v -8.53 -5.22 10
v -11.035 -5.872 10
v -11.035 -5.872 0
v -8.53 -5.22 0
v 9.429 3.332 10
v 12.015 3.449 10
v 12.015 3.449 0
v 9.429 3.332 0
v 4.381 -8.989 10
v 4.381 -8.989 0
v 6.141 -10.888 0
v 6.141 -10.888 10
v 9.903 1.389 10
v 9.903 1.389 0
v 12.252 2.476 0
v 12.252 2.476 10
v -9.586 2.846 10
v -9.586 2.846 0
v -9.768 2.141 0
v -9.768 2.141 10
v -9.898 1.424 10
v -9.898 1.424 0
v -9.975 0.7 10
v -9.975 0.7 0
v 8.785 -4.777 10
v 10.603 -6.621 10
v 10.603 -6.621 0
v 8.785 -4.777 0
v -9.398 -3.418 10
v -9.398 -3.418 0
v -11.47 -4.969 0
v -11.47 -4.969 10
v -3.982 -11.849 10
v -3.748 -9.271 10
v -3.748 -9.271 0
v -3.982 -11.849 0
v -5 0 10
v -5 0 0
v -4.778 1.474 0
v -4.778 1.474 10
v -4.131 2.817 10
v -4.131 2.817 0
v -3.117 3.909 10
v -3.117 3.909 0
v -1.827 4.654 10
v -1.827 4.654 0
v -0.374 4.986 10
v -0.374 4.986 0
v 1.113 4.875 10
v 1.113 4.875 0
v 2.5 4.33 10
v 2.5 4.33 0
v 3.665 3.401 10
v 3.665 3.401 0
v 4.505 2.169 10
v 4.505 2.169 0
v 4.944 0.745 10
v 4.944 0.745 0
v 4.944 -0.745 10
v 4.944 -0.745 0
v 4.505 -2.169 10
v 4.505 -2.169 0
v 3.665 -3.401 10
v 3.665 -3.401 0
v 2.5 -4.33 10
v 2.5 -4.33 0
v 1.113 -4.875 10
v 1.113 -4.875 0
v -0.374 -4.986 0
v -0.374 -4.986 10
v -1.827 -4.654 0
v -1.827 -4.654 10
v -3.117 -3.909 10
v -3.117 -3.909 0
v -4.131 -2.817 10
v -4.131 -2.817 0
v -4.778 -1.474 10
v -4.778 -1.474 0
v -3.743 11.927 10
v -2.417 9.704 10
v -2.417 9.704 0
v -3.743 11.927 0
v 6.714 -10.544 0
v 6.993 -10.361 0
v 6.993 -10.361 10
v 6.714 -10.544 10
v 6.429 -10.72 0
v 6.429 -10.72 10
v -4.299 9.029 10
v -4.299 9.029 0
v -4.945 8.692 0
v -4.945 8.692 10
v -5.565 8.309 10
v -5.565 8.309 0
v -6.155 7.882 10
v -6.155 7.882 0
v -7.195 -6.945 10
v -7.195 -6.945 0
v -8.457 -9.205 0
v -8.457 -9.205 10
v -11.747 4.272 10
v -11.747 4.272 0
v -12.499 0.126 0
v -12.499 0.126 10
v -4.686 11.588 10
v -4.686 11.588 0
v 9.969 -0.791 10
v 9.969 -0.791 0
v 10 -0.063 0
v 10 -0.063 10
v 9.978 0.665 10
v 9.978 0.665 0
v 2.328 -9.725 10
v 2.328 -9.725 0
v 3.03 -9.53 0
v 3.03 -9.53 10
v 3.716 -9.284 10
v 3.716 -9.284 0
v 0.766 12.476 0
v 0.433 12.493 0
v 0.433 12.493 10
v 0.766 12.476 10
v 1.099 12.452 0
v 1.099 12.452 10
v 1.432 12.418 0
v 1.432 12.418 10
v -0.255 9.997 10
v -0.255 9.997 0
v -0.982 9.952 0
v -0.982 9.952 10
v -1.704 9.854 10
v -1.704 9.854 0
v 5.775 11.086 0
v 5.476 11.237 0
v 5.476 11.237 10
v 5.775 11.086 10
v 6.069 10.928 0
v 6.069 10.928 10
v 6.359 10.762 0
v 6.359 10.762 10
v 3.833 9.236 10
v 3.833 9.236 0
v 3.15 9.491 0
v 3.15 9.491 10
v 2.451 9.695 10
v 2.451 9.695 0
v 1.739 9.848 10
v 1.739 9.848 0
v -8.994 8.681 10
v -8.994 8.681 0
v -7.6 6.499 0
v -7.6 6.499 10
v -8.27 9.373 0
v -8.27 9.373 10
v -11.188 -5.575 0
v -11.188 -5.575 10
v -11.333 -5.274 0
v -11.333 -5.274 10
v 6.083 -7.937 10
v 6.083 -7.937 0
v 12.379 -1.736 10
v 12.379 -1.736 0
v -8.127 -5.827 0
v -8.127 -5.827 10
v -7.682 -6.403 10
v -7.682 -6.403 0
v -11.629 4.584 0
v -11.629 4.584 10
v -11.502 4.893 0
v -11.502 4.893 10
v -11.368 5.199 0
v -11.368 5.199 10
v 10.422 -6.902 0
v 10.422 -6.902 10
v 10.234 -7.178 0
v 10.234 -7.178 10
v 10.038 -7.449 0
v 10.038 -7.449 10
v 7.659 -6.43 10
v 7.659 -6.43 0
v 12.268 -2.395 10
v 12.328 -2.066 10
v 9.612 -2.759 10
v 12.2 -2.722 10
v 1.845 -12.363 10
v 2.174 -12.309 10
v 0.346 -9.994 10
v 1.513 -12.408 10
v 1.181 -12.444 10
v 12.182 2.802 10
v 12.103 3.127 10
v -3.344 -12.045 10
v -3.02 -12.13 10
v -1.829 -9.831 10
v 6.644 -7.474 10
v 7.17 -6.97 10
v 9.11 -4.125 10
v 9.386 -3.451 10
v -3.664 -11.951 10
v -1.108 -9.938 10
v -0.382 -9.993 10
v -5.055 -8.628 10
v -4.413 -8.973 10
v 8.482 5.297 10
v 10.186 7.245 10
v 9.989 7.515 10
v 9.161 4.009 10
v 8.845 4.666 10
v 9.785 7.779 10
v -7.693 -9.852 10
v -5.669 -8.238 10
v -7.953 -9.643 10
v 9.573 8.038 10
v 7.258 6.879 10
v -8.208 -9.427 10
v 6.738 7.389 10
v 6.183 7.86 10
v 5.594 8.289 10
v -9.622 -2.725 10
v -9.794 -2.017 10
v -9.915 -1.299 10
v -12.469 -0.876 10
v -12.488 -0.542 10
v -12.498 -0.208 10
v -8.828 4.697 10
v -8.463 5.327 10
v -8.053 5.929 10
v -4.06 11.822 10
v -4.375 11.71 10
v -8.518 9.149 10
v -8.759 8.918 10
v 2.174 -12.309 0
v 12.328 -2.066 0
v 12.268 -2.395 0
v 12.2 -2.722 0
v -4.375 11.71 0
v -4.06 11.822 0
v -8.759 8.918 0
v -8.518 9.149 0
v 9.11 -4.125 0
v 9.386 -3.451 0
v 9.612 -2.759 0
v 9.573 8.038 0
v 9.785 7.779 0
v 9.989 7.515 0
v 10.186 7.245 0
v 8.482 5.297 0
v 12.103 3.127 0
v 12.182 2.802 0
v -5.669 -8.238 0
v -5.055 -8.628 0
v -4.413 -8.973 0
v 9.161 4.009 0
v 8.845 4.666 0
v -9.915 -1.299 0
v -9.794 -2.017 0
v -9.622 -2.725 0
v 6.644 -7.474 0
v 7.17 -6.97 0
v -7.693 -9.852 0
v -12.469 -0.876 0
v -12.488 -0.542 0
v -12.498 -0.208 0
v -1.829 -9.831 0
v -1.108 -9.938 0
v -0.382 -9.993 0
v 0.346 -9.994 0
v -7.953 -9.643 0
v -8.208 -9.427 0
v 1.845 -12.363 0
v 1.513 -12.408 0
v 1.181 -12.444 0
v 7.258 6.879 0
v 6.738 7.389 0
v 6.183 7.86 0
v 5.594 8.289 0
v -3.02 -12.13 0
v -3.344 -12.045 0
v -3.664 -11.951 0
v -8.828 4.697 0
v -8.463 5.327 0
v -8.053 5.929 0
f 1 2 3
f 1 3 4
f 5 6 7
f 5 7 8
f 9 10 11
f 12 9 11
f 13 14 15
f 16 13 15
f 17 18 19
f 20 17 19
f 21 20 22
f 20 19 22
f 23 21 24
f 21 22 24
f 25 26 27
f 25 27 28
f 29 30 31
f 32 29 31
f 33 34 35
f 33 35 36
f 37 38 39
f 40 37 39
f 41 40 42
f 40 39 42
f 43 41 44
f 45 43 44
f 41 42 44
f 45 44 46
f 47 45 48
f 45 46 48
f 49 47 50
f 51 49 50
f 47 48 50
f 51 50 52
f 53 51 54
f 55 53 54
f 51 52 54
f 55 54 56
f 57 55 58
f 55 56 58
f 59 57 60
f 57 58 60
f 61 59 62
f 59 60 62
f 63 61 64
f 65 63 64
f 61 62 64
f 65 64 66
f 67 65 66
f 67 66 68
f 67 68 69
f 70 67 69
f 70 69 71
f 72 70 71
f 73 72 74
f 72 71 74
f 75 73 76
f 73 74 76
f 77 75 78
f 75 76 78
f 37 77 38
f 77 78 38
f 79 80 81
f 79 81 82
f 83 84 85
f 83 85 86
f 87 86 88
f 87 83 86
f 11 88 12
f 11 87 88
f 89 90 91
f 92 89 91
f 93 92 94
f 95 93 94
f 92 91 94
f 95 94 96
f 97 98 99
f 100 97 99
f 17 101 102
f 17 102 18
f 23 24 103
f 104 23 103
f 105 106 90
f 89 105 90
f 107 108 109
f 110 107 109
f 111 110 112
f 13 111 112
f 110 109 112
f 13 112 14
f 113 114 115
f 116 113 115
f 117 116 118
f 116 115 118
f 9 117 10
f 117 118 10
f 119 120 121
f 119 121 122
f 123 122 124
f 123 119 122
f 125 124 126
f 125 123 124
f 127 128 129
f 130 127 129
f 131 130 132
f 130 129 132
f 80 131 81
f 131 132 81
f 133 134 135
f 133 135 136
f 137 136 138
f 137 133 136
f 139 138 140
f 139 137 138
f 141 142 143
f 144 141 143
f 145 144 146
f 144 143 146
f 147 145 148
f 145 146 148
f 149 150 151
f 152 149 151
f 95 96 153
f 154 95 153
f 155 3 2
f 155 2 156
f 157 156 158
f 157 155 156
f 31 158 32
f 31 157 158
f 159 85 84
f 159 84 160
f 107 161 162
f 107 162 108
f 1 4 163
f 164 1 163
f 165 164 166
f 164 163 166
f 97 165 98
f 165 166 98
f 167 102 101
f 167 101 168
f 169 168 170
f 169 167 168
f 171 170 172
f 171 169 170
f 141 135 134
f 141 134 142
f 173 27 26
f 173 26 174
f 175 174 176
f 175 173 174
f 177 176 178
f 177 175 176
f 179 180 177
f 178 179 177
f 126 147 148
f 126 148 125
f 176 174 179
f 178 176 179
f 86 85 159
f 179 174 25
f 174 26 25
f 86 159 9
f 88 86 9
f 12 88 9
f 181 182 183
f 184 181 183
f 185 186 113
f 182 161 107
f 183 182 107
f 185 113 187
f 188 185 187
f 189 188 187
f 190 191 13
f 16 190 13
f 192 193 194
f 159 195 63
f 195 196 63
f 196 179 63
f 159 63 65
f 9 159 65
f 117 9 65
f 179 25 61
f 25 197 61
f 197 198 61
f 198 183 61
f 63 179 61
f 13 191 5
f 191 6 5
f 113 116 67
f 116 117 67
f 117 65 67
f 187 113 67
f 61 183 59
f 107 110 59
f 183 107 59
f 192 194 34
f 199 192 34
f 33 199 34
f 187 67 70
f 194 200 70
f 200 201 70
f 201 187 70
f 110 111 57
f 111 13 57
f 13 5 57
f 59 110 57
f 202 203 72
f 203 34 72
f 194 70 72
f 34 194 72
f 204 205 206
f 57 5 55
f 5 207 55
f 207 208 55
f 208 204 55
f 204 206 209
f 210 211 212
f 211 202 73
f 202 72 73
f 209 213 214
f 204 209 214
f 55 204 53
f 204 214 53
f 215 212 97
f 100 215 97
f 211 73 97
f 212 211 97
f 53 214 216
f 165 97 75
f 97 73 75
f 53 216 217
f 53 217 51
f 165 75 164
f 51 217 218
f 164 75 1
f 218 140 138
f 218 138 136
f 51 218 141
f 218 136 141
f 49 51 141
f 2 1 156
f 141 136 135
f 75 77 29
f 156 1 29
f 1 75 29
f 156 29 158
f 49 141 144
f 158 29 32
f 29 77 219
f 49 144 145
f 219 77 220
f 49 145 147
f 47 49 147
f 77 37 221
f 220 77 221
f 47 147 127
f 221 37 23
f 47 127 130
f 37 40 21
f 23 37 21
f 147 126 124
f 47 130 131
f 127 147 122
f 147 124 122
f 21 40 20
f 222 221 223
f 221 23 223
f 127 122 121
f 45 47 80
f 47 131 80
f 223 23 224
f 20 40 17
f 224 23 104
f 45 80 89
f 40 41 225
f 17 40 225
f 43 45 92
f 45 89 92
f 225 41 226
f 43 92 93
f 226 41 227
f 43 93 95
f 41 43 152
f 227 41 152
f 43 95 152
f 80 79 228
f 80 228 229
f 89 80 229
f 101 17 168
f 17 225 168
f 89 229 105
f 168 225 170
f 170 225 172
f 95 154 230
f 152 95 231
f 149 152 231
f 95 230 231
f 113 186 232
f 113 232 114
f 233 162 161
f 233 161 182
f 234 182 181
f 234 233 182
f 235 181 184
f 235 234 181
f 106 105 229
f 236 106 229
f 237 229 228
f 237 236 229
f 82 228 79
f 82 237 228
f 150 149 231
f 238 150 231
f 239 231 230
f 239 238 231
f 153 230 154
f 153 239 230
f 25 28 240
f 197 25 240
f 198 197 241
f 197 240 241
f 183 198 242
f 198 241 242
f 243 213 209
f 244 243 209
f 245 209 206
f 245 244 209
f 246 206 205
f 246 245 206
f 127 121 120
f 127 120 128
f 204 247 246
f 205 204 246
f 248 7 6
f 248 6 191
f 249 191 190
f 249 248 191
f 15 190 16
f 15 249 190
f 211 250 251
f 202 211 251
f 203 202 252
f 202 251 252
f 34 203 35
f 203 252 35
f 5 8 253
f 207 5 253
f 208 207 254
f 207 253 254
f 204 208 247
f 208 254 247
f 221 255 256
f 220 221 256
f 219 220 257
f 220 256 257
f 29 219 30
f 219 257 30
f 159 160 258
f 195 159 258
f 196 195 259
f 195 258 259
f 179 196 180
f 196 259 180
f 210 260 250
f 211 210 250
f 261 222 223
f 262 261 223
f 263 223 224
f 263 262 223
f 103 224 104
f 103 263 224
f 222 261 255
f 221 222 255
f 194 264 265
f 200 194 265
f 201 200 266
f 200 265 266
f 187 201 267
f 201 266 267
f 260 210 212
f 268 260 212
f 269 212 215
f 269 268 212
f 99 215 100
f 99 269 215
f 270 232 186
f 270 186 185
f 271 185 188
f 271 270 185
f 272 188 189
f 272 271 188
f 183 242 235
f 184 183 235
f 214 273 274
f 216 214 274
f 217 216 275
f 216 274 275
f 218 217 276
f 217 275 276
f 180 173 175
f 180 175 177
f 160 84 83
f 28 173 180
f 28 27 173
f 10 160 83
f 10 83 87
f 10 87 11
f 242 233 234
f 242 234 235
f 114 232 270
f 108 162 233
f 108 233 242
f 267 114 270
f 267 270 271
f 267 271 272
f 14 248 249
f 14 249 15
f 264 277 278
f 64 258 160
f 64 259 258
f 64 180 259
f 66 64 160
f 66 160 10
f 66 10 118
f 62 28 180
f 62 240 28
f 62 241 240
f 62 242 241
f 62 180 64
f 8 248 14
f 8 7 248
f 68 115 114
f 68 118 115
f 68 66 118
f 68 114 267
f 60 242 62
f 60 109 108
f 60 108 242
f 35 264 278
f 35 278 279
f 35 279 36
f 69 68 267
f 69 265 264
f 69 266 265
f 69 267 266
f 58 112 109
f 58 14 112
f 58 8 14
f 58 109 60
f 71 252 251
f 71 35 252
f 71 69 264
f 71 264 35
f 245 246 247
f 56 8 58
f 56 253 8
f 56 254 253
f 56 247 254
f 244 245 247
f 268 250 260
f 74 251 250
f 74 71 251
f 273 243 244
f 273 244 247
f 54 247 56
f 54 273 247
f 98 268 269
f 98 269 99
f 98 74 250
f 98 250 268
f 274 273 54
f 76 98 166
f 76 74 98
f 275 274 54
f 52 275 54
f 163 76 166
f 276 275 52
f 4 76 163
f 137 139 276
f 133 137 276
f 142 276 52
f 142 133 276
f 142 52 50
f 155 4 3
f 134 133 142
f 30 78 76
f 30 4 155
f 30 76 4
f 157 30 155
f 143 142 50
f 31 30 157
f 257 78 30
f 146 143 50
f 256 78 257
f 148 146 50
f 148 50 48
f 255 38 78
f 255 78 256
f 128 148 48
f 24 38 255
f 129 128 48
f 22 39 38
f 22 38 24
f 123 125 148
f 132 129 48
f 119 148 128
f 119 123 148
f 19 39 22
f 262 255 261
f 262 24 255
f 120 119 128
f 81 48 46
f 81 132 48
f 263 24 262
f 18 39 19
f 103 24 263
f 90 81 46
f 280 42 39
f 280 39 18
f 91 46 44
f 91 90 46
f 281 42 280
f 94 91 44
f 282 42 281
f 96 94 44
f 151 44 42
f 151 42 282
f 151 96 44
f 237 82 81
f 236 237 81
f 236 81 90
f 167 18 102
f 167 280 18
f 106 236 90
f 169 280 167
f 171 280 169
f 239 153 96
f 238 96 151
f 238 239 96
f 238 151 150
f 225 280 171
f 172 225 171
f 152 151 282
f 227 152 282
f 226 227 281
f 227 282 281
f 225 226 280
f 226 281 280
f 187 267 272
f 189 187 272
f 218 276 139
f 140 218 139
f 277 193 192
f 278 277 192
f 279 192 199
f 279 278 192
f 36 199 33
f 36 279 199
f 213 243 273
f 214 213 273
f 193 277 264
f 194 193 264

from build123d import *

# Parameters (mm, degrees)
SKETCH1_R           = 10
SKETCH1_R_2         = 5
BOSS_EXTRUDE1_DEPTH = 10
SKETCH2_R           = 12.5
BOSS_EXTRUDE2_DEPTH = 10
SKETCH3_R           = 5
CUT_EXTRUDE1_DEPTH  = 10
CUT_EXTRUDE4_DEPTH  = 10


with BuildPart() as part:
    # Sketch1 → Boss-Extrude1 (new body)
    with BuildSketch(Plane.XY):
        Circle(SKETCH1_R)
        Circle(SKETCH1_R_2, mode=Mode.SUBTRACT)
    extrude(amount=BOSS_EXTRUDE1_DEPTH)

    # Sketch2 → Boss-Extrude2 (add)
    with BuildSketch(Plane(origin=(0, 0, 0), x_dir=(-1, 0, 0), z_dir=(0, 0, -1))):
        Circle(SKETCH2_R)
    extrude(amount=-BOSS_EXTRUDE2_DEPTH)

    # Sketch3 → Cut-Extrude1 (cut)
    with BuildSketch(Plane(origin=(0, 0, 0), x_dir=(-1, 0, 0), z_dir=(0, 0, -1))):
        Circle(SKETCH3_R)
    extrude(amount=-CUT_EXTRUDE1_DEPTH, mode=Mode.SUBTRACT)

    # Sketch4 → Cut-Extrude4 (cut)
    with BuildSketch(Plane(origin=(0, 0, 0), x_dir=(-1, 0, 0), z_dir=(0, 0, -1))):
        with BuildLine():
            Line((-9.669699641, 8.08598777), (-7.258106214, 6.878945717))
            ThreePointArc((-7.258106214, 6.878945717), (-6.46463523, 7.629448954), (-5.59405076, 8.288944209))
            Line((-5.59405076, 8.288944209), (-6.390582917, 10.864931631))
            ThreePointArc((-6.390582917, 10.864931631), (-8.149466314, 9.616261652), (-9.669699641, 8.08598777))
        make_face()
        with BuildLine():
            Line((-5.544842662, 11.31993857), (-3.832690674, 9.23636737))
            ThreePointArc((-3.832690674, 9.23636737), (-2.802561694, 9.599252468), (-1.73900232, 9.847632758))
            Line((-1.73900232, 9.847632758), (-1.418922177, 12.524893183))
            ThreePointArc((-1.418922177, 12.524893183), (-3.53362195, 12.099578724), (-5.544842662, 11.31993857))
        make_face()
        with BuildLine():
            Line((-0.461232014, 12.596569152), (0.255431902, 9.996737195))
            ThreePointArc((0.255431902, 9.996737195), (1.34410022, 9.909258025), (2.41673542, 9.70357614))
            Line((2.41673542, 9.70357614), (3.798083099, 12.019186917))
            ThreePointArc((3.798083099, 12.019186917), (1.693217751, 12.490768712), (-0.461232014, 12.596569152))
        make_face()
        with BuildLine():
            Line((4.70212984, 11.695138492), (4.299387983, 9.028580341))
            ThreePointArc((4.299387983, 9.028580341), (5.258354995, 8.505862846), (6.15459765, 7.881683054))
            Line((6.15459765, 7.881683054), (8.358365302, 9.435254043))
            ThreePointArc((8.358365302, 9.435254043), (6.627284721, 10.722191316), (4.70212984, 11.695138492))
        make_face()
        with BuildLine():
            Line((9.052450727, 8.771512139), (7.599940822, 6.499299924))
            ThreePointArc((7.599940822, 6.499299924), (8.26339242, 5.631726707), (8.828274034, 4.696975365))
            Line((8.828274034, 4.696975365), (11.473410211, 5.219880028))
            ThreePointArc((11.473410211, 5.219880028), (10.415433955, 7.099649632), (9.052450727, 8.771512139))
        make_face()
        with BuildLine():
            Line((11.837520645, 4.331211651), (9.58639485, 2.846231506))
            ThreePointArc((9.58639485, 2.846231506), (9.839614226, 1.783813859), (9.975461635, 0.700117964))
            Line((9.975461635, 0.700117964), (12.604598262, 0.101941336))
            ThreePointArc((12.604598262, 0.101941336), (12.402660038, 2.249514029), (11.837520645, 4.331211651))
        make_face()
        with BuildLine():
            Line((12.575775702, -0.857994679), (9.915274118, -1.298976196))
            ThreePointArc((9.915274118, -1.298976196), (9.714477342, -2.372536612), (9.397801295, -3.417796193))
            Line((9.397801295, -3.417796193), (11.556336764, -5.03362394))
            ThreePointArc((11.556336764, -5.03362394), (12.245353525, -2.989582985), (12.575775702, -0.857994679))
        make_face()
        with BuildLine():
            Line((11.139564893, -5.898845935), (8.529712414, -5.219579114))
            ThreePointArc((8.529712414, -5.219579114), (7.909619072, -6.118653948), (7.195175735, -6.944742338))
            Line((7.195175735, -6.944742338), (8.509879654, -9.298829908))
            ThreePointArc((8.509879654, -9.298829908), (9.970714142, -7.711753943), (11.139564893, -5.898845935))
        make_face()
        with BuildLine():
            Line((7.777222115, -9.919733139), (5.669285944, -8.237669384))
            ThreePointArc((5.669285944, -8.237669384), (4.737115808, -8.80680043), (3.748438924, -9.270879442))
            Line((3.748438924, -9.270879442), (3.991987042, -11.956183707))
            ThreePointArc((3.991987042, -11.956183707), (5.972047703, -11.100492584), (7.777222115, -9.919733139))
        make_face()
        with BuildLine():
            Line((3.070126979, -12.225408366), (1.82858843, -9.831391781))
            ThreePointArc((1.82858843, -9.831391781), (0.745522186, -9.972171111), (-0.34643703, -9.993997268))
            Line((-0.34643703, -9.993997268), (-1.216156396, -12.546204725))
            ThreePointArc((-1.216156396, -12.546204725), (0.940759962, -12.569855213), (3.070126979, -12.225408366))
        make_face()
        with BuildLine():
            Line((-2.167821003, -12.417199422), (-2.328288635, -9.725177224))
            ThreePointArc((-2.328288635, -9.725177224), (-3.374978996, -9.413262813), (-4.381410875, -8.989062173))
            Line((-4.381410875, -8.989062173), (-6.214015345, -10.966872967))
            ThreePointArc((-6.214015345, -10.966872967), (-4.253193723, -11.865775682), (-2.167821003, -12.417199422))
        make_face()
        with BuildLine():
            Line((-7.03093304, -10.461943891), (-6.082583444, -7.937391174))
            ThreePointArc((-6.082583444, -7.937391174), (-6.911915648, -7.226715857), (-7.658798975, -6.429836565))
            Line((-7.658798975, -6.429836565), (-10.137414587, -7.491269242))
            ThreePointArc((-10.137414587, -7.491269242), (-8.711731575, -9.109995738), (-7.03093304, -10.461943891))
        make_face()
        with BuildLine():
            Line((-10.678332879, -6.697723217), (-8.785144317, -4.777158081))
            ThreePointArc((-8.785144317, -4.777158081), (-9.253719292, -3.790604077), (-9.611911155, -2.758833802))
            Line((-9.611911155, -2.758833802), (-12.307962753, -2.72035701))
            ThreePointArc((-12.307962753, -2.72035701), (-11.663931893, -4.77901477), (-10.678332879, -6.697723217))
        make_face()
        with BuildLine():
            Line((-12.479351955, -1.775405353), (-9.968673927, -0.790910957))
            ThreePointArc((-9.968673927, -0.790910957), (-9.995470803, 0.300937585), (-9.903036574, 1.389196388))
            Line((-9.903036574, 1.389196388), (-12.350352343, 2.520929664))
            ThreePointArc((-12.350352343, 2.520929664), (-12.599332424, 0.378301268), (-12.479351955, -1.775405353))
        make_face()
        with BuildLine():
            Line((-12.122577706, 3.453896227), (-9.428529252, 3.332091857))
            ThreePointArc((-9.428529252, 3.332091857), (-9.008914606, 4.340444404), (-8.481837004, 5.297021903))
            Line((-8.481837004, 5.297021903), (-10.257253815, 7.326324696))
            ThreePointArc((-10.257253815, 7.326324696), (-11.356193917, 5.47020558), (-12.122577706, 3.453896227))
        make_face()
    extrude(amount=-CUT_EXTRUDE4_DEPTH, mode=Mode.SUBTRACT)


solid = part.part
